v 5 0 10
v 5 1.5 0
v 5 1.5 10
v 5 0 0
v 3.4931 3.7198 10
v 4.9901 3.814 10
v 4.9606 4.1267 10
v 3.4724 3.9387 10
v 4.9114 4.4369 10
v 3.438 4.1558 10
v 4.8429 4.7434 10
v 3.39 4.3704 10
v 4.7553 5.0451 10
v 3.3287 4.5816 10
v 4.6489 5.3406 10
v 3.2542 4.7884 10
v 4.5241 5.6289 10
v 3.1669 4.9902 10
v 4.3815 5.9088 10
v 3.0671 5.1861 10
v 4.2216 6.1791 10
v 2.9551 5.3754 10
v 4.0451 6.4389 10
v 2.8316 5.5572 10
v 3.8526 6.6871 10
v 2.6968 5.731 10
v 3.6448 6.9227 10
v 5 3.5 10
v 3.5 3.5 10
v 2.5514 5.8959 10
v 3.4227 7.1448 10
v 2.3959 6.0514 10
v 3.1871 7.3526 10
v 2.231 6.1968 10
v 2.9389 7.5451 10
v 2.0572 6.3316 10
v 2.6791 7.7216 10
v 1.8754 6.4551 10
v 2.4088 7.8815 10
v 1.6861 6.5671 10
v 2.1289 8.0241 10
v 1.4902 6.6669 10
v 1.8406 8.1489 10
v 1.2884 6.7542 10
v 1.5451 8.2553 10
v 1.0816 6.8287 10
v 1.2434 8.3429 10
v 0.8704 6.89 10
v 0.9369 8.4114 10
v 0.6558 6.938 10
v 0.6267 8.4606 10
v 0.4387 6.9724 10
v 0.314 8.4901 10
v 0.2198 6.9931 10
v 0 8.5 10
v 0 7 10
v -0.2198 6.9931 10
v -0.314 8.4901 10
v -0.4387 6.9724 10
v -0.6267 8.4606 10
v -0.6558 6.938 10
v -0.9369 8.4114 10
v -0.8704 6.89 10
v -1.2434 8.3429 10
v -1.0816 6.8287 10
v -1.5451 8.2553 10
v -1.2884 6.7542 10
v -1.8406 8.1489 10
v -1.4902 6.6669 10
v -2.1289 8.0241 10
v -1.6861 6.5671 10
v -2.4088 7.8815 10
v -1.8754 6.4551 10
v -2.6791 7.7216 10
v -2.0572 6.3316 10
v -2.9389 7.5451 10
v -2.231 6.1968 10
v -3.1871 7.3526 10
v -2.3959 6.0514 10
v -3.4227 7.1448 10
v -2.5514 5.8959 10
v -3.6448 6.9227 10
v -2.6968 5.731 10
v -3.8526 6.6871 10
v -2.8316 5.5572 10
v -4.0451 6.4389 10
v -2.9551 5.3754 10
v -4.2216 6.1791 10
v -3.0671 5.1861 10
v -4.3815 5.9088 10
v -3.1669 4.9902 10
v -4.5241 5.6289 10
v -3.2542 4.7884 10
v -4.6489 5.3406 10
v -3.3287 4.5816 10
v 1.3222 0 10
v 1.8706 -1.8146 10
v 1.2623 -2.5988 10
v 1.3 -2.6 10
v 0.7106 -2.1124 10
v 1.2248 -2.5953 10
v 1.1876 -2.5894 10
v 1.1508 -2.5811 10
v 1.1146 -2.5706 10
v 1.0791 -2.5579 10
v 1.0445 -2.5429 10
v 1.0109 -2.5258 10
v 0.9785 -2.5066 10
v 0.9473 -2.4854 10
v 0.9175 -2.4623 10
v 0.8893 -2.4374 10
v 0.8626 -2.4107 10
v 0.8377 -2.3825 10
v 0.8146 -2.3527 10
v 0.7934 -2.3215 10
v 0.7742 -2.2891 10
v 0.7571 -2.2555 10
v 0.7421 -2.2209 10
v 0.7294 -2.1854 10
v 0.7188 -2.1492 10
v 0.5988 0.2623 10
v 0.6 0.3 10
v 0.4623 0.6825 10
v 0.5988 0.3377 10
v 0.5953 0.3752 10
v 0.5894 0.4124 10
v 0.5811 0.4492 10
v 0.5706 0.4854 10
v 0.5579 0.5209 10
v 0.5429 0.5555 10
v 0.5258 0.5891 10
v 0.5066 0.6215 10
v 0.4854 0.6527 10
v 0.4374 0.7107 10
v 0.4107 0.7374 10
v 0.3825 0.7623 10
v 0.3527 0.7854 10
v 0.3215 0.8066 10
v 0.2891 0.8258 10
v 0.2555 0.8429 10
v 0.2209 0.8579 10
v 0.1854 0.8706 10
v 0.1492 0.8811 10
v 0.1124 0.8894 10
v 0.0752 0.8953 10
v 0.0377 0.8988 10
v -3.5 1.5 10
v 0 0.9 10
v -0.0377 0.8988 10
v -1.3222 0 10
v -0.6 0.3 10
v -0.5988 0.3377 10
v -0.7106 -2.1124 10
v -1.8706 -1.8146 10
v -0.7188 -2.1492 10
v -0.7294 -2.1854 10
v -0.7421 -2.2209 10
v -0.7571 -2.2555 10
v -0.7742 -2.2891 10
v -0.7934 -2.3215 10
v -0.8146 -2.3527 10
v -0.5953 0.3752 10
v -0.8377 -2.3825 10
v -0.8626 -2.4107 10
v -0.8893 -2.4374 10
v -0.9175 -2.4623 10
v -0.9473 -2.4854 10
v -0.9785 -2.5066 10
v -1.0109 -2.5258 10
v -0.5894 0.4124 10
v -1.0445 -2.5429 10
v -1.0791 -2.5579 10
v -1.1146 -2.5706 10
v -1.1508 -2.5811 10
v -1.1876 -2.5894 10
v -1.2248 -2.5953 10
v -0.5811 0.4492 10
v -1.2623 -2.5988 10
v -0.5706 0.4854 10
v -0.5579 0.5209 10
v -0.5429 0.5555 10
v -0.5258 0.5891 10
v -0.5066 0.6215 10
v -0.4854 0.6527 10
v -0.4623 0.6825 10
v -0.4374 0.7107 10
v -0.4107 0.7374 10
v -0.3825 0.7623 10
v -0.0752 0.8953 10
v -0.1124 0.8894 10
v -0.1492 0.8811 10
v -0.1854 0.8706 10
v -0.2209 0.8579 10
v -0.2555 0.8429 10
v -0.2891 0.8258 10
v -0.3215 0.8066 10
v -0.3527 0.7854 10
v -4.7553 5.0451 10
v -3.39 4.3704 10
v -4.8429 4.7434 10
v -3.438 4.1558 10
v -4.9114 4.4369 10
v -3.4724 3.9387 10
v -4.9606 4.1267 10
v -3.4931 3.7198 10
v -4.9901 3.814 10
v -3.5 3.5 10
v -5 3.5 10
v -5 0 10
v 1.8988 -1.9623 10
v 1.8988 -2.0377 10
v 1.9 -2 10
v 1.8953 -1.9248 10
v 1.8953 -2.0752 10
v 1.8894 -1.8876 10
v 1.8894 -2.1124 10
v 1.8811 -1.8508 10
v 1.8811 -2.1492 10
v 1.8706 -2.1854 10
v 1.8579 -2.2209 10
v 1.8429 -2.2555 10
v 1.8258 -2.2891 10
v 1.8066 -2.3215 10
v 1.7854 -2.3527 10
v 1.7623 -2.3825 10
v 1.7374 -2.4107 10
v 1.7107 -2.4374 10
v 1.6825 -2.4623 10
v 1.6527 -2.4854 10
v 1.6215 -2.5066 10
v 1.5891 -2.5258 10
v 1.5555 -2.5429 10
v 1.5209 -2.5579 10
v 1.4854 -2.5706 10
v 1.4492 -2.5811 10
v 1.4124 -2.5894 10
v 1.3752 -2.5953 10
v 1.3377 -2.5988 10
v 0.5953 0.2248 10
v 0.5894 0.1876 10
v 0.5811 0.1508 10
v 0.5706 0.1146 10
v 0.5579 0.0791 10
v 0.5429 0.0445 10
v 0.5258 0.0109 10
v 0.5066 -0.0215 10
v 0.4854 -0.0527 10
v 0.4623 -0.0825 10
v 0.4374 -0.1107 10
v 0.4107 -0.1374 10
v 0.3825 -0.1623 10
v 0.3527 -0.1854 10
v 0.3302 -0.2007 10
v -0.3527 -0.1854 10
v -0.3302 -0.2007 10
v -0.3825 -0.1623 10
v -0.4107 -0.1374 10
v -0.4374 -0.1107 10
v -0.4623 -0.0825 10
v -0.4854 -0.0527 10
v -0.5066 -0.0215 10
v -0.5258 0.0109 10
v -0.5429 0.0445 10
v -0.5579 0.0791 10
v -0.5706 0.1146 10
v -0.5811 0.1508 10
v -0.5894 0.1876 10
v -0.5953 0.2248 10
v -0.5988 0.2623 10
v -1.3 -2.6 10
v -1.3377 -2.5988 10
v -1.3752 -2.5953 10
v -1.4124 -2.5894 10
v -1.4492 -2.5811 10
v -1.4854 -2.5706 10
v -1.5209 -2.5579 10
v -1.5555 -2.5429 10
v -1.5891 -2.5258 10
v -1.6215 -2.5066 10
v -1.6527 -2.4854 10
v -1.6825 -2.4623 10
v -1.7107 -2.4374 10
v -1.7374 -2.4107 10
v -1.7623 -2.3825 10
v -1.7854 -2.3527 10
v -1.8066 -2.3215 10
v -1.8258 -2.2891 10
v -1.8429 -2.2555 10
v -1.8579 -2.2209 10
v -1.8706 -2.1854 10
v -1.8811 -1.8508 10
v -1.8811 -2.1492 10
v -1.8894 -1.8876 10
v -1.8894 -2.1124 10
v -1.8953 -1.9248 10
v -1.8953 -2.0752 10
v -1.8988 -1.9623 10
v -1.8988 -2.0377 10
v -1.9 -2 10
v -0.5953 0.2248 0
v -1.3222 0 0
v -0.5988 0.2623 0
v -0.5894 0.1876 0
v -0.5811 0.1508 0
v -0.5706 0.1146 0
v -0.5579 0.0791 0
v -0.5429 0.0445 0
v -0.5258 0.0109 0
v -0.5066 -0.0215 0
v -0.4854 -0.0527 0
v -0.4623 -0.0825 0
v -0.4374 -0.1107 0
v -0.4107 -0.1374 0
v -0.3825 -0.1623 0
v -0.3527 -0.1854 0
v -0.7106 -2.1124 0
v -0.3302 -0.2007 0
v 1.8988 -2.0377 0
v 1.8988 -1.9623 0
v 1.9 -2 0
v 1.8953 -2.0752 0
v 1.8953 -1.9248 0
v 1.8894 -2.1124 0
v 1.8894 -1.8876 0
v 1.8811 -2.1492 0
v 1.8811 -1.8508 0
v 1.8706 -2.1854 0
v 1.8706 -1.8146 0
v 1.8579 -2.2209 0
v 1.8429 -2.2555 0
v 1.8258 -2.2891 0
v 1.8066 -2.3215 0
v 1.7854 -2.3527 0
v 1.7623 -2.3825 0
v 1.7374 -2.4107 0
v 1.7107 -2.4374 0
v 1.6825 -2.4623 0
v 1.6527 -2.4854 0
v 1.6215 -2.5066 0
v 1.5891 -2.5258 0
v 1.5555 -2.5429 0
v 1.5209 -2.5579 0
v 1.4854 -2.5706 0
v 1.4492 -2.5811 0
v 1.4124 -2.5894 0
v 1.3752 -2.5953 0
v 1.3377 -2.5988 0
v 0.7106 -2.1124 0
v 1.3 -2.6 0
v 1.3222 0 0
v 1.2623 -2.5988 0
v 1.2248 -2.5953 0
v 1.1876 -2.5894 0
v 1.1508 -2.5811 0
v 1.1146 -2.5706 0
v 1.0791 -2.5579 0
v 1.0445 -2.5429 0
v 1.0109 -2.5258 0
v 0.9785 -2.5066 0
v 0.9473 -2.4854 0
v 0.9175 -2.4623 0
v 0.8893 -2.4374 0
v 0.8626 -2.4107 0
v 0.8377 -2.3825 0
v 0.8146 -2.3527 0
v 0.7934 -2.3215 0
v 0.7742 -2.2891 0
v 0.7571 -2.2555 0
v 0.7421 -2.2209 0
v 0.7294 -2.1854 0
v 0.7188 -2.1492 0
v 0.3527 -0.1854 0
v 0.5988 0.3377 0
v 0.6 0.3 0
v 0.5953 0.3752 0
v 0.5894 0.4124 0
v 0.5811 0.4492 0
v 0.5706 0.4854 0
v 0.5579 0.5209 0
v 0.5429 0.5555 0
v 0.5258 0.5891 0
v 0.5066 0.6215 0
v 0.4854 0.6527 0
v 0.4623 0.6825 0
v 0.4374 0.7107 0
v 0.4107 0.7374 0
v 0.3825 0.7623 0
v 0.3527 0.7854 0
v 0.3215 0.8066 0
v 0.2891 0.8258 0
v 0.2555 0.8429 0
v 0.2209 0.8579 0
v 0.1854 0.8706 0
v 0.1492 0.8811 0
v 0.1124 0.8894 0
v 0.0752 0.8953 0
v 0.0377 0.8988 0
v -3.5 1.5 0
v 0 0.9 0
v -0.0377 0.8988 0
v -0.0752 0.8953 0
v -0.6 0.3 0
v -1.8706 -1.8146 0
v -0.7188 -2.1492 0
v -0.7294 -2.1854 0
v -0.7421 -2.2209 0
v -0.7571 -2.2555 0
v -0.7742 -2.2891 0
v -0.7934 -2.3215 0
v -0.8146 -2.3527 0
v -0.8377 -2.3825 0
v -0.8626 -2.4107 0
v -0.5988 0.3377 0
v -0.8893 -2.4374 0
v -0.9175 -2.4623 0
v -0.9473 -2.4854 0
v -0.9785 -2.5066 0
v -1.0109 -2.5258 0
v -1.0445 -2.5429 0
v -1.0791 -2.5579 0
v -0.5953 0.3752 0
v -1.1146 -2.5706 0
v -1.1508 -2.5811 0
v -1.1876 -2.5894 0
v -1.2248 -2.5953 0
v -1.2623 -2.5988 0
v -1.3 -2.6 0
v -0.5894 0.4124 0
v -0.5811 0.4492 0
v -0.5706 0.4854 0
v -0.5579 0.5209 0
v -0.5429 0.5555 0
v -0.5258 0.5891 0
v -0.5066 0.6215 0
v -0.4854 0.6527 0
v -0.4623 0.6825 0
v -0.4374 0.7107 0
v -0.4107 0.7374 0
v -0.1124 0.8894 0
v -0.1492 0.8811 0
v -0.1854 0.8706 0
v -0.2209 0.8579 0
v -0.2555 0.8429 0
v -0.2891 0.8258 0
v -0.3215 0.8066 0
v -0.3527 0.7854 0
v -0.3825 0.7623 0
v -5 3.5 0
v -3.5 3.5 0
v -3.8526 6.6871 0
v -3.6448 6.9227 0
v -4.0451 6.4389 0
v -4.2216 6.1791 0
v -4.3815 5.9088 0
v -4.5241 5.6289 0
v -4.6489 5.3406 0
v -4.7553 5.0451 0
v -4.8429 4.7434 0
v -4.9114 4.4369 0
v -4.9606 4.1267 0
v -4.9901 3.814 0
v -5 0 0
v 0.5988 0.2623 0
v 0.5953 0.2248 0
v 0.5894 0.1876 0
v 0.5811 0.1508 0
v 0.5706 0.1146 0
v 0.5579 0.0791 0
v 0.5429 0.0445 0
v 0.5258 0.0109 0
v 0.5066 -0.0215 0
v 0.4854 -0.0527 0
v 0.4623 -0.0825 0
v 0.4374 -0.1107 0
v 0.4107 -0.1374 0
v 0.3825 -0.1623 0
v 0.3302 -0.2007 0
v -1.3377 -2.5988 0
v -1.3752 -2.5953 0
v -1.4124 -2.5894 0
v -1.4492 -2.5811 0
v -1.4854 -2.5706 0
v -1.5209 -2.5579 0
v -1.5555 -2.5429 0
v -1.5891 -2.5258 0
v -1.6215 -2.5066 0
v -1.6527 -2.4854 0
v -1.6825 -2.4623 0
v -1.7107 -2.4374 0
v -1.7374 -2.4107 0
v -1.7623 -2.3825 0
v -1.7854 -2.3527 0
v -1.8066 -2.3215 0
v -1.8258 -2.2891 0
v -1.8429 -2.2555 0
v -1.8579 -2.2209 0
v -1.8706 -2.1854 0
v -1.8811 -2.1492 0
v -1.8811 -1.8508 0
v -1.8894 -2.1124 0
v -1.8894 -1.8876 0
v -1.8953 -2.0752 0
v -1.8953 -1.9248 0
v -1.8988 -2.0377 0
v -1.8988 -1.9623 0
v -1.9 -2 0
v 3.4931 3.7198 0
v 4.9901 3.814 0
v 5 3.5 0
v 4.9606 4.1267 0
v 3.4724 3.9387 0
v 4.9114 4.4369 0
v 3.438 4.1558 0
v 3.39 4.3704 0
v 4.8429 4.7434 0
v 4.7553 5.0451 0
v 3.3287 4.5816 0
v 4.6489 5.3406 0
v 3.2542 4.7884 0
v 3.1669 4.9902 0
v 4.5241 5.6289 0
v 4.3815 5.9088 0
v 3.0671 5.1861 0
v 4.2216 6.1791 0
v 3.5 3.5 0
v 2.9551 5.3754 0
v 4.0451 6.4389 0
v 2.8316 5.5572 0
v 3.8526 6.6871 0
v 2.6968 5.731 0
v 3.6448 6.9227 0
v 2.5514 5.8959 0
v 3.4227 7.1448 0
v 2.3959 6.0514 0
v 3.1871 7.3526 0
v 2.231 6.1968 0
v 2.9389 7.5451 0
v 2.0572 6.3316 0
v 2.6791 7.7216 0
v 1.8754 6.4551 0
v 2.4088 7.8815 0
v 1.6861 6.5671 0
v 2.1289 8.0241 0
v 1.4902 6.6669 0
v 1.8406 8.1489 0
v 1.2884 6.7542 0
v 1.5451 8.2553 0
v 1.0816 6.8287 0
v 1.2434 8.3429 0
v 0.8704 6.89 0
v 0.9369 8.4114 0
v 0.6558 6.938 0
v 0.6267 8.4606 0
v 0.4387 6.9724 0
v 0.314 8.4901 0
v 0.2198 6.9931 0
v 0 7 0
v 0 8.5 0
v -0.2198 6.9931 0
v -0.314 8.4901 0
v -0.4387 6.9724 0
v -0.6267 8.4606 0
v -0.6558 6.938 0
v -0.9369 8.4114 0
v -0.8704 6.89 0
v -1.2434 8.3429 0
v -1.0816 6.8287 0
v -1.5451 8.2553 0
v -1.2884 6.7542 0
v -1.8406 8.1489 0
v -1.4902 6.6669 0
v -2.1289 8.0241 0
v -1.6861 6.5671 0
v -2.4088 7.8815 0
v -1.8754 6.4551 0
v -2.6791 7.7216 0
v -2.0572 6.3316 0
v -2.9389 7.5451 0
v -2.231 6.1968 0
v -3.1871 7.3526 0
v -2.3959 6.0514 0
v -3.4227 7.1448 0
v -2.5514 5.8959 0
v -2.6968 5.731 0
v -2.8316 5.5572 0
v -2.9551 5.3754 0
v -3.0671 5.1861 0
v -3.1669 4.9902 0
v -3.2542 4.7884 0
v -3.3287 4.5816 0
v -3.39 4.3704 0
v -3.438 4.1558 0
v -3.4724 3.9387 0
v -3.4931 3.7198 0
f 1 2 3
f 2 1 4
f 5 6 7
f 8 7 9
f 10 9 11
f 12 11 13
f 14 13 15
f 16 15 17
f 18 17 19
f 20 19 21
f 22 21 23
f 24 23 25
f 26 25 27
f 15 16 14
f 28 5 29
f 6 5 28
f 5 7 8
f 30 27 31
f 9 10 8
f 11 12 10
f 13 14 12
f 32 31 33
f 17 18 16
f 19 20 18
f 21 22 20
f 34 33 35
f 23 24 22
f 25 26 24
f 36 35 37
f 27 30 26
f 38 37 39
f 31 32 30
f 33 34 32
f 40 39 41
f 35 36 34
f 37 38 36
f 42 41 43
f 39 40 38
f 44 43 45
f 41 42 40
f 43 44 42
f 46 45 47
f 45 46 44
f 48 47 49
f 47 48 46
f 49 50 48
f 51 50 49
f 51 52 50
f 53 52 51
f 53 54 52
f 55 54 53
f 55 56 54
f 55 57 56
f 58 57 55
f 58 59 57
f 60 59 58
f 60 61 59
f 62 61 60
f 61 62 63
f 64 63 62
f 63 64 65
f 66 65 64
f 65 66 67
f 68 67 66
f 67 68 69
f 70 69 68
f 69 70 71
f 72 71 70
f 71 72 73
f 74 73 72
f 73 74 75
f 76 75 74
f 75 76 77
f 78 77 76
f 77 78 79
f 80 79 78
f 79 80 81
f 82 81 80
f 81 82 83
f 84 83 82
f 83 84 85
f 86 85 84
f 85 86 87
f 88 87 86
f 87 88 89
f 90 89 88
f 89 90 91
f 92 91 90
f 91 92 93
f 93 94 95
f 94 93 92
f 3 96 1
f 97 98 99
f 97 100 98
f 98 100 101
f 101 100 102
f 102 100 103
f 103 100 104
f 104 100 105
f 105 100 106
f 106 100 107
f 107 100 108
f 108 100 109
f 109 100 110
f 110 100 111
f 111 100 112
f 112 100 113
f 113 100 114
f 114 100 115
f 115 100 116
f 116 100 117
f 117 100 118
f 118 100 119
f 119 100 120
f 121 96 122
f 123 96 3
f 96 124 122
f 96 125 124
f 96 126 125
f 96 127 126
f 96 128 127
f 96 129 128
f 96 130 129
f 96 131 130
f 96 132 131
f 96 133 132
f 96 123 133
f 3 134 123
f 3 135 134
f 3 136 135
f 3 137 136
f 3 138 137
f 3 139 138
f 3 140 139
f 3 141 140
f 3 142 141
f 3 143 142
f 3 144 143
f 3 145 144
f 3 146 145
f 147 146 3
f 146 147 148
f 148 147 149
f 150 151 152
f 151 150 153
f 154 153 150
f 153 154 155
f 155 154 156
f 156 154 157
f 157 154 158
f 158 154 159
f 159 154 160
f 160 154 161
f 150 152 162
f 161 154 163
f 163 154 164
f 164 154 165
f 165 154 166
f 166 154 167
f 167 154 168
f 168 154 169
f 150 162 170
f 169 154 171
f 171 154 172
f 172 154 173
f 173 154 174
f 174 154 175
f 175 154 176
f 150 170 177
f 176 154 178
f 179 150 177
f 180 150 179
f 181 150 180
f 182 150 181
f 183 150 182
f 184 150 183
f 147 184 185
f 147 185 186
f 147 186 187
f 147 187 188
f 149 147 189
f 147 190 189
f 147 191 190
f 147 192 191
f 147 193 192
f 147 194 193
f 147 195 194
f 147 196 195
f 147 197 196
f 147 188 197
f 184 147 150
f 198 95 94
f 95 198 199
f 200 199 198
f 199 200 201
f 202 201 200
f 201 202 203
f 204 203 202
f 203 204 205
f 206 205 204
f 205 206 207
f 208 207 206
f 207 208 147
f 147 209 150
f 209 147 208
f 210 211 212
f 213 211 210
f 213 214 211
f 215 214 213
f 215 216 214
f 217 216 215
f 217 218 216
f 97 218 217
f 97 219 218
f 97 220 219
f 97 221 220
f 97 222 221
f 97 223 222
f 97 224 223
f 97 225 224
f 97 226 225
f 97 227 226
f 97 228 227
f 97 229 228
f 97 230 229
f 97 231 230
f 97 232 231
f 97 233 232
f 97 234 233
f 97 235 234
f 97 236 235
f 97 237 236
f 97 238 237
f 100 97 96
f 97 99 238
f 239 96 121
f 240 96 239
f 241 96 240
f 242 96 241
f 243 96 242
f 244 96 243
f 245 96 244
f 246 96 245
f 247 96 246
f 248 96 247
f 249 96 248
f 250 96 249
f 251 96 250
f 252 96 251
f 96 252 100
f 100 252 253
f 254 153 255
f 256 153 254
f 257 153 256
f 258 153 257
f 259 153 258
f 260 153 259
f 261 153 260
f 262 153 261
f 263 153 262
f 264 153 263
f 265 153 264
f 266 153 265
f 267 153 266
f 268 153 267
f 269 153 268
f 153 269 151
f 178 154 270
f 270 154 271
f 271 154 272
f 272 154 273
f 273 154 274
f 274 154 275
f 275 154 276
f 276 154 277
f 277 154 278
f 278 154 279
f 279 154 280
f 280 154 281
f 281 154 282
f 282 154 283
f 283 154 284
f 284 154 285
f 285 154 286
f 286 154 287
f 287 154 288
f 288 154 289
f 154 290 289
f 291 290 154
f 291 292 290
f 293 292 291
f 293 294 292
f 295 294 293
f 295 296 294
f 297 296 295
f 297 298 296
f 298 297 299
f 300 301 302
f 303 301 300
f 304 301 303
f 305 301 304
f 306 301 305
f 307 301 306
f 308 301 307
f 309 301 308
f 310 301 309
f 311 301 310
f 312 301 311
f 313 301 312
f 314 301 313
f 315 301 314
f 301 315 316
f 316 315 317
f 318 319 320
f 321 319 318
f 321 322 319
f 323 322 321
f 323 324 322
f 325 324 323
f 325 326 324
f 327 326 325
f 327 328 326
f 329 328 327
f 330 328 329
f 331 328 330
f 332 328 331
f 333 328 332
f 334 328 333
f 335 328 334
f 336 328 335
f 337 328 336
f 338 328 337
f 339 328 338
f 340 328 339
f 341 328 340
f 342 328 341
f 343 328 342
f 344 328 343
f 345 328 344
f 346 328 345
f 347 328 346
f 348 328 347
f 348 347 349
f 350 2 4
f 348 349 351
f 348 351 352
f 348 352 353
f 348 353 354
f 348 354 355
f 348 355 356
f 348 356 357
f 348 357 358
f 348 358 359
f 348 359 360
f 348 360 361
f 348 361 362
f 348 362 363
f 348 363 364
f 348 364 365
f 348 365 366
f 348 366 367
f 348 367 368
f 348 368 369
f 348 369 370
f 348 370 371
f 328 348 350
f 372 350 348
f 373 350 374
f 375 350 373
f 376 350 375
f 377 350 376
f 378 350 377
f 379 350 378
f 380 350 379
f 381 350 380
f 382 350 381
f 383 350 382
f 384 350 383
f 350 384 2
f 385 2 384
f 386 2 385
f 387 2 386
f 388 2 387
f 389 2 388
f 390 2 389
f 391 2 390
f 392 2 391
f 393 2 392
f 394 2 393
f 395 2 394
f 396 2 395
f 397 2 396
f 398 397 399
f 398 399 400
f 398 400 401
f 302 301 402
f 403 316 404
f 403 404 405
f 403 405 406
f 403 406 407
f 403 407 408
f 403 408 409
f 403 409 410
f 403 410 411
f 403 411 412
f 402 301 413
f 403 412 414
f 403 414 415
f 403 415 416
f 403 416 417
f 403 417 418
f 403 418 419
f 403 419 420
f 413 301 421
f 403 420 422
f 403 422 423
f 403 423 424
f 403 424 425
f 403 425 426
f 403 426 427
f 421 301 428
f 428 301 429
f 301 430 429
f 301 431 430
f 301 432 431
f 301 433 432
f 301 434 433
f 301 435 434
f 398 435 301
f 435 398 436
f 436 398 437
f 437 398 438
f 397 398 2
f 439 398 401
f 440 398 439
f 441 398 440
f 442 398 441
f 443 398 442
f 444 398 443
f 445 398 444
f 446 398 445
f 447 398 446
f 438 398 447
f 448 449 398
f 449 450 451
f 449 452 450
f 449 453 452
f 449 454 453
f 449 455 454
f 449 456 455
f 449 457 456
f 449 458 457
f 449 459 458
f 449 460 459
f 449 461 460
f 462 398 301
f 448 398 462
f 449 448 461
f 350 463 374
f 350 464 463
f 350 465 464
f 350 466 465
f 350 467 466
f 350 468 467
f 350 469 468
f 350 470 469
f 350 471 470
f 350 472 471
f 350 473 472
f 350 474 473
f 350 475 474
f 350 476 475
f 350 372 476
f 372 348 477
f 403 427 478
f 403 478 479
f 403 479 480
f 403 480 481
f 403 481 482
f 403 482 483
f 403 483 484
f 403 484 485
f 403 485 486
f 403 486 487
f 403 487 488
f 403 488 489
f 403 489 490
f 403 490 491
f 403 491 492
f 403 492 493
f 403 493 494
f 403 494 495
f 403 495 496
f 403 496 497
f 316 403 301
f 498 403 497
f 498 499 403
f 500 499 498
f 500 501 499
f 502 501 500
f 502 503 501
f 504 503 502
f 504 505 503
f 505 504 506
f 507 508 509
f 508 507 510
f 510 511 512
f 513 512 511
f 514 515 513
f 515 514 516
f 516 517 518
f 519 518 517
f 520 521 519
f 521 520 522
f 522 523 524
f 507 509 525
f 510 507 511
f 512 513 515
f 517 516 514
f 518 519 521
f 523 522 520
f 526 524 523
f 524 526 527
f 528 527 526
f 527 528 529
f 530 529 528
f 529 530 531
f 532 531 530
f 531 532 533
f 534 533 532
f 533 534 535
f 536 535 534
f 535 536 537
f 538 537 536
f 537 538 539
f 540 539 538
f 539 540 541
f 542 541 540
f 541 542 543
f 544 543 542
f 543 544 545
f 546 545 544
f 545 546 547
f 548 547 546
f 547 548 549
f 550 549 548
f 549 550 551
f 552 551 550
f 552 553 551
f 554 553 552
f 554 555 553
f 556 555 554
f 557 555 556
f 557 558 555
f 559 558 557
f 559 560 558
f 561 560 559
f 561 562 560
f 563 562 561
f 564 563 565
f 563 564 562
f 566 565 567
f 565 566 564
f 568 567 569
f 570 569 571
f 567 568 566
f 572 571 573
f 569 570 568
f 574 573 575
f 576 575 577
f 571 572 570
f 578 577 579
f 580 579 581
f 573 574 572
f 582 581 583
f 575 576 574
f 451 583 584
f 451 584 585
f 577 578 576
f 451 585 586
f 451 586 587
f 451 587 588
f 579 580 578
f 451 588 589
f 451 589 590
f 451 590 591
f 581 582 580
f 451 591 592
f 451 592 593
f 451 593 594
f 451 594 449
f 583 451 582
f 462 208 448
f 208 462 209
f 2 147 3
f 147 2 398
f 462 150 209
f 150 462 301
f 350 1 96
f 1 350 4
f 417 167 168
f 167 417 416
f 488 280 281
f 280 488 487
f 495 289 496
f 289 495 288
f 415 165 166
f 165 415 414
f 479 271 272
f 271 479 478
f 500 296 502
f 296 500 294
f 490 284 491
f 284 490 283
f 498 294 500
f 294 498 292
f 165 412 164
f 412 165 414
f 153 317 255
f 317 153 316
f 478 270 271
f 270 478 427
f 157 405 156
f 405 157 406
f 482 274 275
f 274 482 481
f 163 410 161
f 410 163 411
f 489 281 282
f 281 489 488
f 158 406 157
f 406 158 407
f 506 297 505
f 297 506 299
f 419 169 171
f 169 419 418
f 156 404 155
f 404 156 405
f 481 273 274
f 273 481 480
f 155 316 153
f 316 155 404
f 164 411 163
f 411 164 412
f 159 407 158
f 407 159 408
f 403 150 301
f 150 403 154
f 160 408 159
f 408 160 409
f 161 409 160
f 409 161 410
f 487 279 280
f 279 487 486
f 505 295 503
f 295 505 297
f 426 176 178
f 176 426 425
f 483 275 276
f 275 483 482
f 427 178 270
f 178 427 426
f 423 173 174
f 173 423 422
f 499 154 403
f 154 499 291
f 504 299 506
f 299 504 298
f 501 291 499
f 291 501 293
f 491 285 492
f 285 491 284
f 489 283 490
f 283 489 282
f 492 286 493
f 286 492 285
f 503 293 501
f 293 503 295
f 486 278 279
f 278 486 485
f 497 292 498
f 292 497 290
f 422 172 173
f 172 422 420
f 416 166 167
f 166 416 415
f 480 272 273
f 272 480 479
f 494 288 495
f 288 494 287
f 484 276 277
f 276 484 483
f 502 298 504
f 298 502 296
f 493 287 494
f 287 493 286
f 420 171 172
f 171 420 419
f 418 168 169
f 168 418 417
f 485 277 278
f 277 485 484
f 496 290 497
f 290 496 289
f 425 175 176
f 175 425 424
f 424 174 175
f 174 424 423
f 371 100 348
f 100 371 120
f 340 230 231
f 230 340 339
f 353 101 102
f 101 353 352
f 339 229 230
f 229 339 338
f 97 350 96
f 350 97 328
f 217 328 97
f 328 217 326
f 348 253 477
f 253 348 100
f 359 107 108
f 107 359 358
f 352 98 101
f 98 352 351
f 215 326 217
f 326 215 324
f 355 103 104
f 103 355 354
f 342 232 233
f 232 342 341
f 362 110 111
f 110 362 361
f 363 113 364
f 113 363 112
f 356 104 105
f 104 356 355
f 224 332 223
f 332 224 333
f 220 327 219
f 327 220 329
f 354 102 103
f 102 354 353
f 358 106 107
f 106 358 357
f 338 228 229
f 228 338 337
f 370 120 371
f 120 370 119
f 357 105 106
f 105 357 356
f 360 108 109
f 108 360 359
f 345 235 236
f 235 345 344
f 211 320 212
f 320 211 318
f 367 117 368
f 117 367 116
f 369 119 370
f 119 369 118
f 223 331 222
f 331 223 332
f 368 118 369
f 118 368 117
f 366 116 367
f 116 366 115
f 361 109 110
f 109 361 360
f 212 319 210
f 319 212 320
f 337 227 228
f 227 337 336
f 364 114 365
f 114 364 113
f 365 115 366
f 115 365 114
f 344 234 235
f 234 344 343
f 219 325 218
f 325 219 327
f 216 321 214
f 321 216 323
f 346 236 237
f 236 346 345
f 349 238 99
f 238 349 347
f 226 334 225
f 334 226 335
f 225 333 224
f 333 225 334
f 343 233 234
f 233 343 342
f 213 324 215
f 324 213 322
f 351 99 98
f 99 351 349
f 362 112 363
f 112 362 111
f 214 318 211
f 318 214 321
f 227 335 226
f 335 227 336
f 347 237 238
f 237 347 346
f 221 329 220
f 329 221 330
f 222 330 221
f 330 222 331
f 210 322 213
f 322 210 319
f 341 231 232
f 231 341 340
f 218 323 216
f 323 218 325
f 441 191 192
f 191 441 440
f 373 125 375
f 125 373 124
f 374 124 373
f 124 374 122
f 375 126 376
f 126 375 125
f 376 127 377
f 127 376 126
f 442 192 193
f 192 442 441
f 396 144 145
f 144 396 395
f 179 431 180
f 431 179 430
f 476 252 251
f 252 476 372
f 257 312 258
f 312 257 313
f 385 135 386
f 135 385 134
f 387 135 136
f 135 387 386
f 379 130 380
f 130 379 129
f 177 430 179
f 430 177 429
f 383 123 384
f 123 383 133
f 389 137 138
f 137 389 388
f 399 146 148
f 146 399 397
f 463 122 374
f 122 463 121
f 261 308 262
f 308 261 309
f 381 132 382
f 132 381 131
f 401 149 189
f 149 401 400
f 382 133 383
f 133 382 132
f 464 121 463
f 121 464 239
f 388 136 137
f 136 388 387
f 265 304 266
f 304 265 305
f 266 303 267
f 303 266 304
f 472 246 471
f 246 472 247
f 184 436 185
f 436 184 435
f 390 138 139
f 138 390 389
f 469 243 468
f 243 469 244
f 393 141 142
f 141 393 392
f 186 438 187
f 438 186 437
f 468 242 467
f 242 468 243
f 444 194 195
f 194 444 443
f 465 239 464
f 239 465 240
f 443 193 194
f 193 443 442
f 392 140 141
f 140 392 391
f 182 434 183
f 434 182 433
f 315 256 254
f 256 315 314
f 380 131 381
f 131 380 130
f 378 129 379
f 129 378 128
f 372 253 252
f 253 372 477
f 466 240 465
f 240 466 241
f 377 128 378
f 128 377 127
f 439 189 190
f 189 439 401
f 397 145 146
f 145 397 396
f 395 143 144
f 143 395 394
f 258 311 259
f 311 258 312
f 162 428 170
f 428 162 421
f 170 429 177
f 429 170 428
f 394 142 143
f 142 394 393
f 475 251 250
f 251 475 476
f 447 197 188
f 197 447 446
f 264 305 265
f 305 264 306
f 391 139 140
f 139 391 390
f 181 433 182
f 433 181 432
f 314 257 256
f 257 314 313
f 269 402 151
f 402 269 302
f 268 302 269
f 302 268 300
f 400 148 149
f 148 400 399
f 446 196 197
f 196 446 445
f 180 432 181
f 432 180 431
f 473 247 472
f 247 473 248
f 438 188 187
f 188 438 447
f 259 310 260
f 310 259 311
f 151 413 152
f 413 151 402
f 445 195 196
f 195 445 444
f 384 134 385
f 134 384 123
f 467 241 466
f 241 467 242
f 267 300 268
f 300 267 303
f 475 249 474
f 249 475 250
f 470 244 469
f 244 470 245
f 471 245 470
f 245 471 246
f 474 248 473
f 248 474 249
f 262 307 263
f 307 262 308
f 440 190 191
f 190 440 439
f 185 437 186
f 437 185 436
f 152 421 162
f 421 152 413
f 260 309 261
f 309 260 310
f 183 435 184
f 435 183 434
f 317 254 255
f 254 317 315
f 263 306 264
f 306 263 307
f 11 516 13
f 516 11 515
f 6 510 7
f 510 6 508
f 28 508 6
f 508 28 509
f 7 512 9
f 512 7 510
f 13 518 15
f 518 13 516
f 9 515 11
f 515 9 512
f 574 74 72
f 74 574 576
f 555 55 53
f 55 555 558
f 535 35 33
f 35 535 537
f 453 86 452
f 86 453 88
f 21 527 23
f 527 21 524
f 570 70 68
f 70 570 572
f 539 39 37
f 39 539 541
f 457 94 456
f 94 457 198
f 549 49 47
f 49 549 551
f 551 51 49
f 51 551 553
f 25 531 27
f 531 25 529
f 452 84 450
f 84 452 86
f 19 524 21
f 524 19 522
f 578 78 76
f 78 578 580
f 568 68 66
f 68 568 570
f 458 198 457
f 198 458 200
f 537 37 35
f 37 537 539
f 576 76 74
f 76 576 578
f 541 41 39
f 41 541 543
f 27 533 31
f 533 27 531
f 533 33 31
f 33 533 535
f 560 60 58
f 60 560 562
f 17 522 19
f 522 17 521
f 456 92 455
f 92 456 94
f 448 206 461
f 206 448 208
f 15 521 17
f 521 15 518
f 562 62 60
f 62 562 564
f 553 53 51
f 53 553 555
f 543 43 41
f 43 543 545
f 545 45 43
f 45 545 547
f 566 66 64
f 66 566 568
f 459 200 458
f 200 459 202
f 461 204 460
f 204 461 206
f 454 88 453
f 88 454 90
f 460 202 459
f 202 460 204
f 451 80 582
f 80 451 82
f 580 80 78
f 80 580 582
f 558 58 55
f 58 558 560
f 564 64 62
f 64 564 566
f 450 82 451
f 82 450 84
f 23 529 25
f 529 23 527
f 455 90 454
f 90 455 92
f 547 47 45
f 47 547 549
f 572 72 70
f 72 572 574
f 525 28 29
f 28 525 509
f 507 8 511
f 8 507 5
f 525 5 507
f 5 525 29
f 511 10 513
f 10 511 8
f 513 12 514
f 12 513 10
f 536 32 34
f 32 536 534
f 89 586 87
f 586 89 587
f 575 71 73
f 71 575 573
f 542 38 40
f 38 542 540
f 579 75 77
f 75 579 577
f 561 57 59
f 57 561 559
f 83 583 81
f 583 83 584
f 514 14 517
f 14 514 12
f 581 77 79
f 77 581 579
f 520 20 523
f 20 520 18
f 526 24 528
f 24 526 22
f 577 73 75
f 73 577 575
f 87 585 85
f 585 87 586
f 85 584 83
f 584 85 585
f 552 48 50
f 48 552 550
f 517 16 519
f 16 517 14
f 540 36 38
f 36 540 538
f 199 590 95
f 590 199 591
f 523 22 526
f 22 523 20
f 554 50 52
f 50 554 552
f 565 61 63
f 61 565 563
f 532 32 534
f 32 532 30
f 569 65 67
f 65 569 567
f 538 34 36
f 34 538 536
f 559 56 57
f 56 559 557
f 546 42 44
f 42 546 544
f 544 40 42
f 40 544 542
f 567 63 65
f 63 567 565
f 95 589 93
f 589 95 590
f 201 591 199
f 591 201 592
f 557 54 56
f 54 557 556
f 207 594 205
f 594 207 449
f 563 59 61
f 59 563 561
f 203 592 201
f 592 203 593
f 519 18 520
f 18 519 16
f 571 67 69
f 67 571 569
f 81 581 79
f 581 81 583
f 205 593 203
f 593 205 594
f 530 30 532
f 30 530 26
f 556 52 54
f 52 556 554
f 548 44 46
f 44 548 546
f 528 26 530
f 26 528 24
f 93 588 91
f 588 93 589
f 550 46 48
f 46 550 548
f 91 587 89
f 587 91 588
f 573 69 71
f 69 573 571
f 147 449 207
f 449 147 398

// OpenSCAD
$fn=100;
plate_thickness=1.5;
ex=0.1;

//clip();
hook();

module clip(x=10){
    difference(){
        union(){
            translate([0,plate_thickness/2,x/2]) cube([10,plate_thickness,x],center=true);
            //translate([-5, plate_thickness, 0]) hook(x);
            hull(){
                    translate([-0.8,0,0])cylinder(h=x,r=0.5);
                    translate([-2.6/2,-2,0])cylinder(h=x,r=0.6);
                }
                hull(){
                    translate([0.8,0,0])cylinder(h=x,r=0.5);
                    translate([2.6/2,-2,0])cylinder(h=x,r=0.6);
                } 
          } 
          translate([0,0.3,0])cylinder(h=x+1,r=0.6);
    }
}

module hook(x=10){
    union(){
        clip();
        translate([-5, plate_thickness, 0]) {
            r=5;
            s=2;
            cube([plate_thickness, s, x]);
            translate([r, s, 0]) difference(){
                cylinder(r=r, h=x);
                translate([-r, -r, -ex]) cube([2*r, r, x+2*ex]);
                translate([0, 0, -ex]) cylinder(r=r-plate_thickness, h=x+2*ex);
            }
        }
    }
}
